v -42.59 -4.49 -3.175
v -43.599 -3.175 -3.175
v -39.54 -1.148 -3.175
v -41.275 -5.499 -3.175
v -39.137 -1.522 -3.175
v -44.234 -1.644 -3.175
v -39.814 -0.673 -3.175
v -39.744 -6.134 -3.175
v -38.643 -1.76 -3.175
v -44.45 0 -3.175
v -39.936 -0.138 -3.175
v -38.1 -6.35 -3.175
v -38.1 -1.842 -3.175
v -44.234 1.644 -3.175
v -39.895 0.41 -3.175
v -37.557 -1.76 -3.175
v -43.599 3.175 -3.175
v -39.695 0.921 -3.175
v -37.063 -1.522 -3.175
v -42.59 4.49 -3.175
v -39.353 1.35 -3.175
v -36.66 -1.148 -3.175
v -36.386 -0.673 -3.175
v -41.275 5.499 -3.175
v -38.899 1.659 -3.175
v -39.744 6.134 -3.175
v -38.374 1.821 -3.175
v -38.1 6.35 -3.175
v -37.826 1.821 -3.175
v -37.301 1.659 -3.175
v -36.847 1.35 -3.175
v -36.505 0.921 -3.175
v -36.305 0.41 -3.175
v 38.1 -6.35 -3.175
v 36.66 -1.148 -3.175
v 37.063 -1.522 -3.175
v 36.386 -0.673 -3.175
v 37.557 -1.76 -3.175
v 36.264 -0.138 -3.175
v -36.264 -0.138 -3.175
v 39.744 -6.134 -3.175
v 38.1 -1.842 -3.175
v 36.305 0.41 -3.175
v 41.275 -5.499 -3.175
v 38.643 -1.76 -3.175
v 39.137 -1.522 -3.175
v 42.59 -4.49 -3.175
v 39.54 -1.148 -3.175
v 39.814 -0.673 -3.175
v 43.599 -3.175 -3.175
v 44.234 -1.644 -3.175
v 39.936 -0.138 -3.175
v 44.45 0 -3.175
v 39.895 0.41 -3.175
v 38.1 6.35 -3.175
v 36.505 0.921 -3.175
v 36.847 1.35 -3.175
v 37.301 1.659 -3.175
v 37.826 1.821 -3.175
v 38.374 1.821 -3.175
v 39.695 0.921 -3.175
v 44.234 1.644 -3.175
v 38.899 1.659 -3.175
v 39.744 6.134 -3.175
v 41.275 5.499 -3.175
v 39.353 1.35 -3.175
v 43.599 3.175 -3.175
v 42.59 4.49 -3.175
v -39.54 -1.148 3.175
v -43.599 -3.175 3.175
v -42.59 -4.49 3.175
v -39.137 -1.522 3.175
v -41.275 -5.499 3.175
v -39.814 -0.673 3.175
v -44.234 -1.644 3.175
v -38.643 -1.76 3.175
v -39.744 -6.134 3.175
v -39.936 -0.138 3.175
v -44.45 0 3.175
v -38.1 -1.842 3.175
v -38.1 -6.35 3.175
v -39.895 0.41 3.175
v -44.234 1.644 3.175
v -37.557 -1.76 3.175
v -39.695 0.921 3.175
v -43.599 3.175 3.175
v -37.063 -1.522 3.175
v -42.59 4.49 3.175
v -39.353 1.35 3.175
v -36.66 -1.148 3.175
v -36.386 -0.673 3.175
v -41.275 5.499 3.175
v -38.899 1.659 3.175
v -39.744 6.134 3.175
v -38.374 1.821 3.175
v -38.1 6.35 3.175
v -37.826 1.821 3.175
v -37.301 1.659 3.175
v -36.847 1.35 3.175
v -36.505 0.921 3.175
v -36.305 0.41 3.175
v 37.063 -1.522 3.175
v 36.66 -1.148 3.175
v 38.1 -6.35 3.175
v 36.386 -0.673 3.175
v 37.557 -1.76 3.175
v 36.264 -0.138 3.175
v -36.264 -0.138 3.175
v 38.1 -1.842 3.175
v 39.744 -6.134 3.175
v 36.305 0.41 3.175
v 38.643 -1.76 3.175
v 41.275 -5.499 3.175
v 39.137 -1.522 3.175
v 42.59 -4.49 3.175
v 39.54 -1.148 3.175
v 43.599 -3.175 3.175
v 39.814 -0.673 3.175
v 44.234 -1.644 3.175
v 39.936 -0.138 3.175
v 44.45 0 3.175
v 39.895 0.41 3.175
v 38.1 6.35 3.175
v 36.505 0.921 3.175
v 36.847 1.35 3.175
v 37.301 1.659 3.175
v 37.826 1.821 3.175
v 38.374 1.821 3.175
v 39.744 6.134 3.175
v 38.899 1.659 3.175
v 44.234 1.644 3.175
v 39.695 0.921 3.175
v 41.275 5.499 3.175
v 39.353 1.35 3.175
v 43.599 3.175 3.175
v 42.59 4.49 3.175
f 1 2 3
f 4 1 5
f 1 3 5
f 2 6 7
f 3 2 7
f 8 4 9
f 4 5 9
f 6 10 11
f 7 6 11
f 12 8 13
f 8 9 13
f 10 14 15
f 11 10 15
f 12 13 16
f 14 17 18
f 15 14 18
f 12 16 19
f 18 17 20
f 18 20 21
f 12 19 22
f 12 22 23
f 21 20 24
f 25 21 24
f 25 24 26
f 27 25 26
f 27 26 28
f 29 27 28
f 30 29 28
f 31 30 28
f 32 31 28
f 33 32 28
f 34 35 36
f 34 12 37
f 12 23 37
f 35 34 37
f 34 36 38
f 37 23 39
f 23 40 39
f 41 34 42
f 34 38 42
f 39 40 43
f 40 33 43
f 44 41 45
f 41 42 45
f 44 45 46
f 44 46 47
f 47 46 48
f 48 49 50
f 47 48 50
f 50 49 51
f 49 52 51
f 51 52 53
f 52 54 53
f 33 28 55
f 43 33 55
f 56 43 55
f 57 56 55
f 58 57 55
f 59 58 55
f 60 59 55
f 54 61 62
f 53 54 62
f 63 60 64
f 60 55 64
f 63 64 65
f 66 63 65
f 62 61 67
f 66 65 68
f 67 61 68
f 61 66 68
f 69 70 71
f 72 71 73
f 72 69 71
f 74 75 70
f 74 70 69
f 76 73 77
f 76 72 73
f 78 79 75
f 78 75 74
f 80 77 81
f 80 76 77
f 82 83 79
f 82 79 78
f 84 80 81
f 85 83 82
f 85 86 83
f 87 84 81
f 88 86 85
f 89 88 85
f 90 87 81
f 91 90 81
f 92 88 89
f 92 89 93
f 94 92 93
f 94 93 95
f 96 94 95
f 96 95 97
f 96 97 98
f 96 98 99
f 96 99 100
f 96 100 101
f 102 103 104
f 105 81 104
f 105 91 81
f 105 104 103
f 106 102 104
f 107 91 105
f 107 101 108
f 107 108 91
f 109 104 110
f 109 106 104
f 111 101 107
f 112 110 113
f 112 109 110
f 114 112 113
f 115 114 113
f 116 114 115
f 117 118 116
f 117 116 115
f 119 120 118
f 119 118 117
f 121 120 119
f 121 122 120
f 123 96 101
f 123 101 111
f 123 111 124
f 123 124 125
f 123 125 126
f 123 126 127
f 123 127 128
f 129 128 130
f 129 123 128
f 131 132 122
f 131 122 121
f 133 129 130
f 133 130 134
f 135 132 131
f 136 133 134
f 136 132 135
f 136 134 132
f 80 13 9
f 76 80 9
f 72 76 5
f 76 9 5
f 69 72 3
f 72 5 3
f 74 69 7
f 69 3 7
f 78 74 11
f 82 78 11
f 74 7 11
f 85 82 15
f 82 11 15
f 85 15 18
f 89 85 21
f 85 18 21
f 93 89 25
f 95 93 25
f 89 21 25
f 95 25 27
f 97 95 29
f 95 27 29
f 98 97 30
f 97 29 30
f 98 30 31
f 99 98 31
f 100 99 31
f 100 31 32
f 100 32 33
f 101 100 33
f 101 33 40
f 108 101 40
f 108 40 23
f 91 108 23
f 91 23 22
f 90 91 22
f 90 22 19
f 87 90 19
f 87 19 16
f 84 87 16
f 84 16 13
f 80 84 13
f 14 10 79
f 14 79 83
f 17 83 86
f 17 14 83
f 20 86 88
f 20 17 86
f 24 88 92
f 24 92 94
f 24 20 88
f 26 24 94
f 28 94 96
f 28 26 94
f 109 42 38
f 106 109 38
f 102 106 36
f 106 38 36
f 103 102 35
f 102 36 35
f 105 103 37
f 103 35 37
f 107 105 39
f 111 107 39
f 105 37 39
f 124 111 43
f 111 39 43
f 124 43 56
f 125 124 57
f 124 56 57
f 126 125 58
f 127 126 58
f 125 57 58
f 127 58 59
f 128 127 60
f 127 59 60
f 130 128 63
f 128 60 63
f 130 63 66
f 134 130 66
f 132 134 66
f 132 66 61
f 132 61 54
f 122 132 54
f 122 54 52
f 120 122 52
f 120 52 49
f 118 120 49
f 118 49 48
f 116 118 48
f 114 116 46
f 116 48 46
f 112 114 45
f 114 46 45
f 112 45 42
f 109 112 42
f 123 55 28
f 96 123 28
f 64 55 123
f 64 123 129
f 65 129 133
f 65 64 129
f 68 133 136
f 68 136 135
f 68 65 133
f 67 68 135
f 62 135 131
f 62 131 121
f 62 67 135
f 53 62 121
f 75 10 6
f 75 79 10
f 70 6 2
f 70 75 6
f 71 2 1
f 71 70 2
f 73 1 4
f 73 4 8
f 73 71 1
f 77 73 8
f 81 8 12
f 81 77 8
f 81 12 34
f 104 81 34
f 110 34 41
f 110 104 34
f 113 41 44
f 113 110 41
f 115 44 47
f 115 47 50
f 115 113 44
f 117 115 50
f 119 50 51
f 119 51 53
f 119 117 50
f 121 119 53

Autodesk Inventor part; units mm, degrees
ref_plane "YZ Plane" through (0, 0, 0) normal (1, 0, 0) x (0, 1, 0)
ref_plane "XZ Plane" through (0, 0, 0) normal (0, 1, 0) x (-1, 0, 0)
ref_plane "XY Plane" through (0, 0, 0) normal (0, 0, 1) x (1, 0, 0)
sketch "Sketch1" plane through (0, 0, 0) normal (0, 0, 1) x (1, 0, 0)
  line L0 (-44.45, -6.35) -> (44.45, -6.35)
  line L1 (44.45, -6.35) -> (44.45, 6.35)
  line L2 (44.45, 6.35) -> (-44.45, 6.35)
  line L3 (-44.45, 6.35) -> (-44.45, -6.35)
  line L4 (-44.45, -6.35) -> (44.45, 6.35) construction
  line L5 (44.45, -6.35) -> (-44.45, 6.35) construction
  point P0 (0, 0)
  dimension "d0" = 88.9
  dimension "d1" = 12.7
extrude "Plate1" add sketch "Sketch1" along normal mid plane 6.35
fillet "Corner Round1" radius 6.35 4 edges at (-44.45, -6.35, 0) (-44.45, 6.35, 0) (44.45, 6.35, 0) (44.45, -6.35, 0)
sketch "Sketch4" plane through (0, 0, 3.175) normal (0, 0, 1) x (1, 0, 0)
  arc A0 (-38.1, 6.35) -> (-38.1, -6.35) centre (-38.1, 0) ccw construction
  arc A1 (38.1, -6.35) -> (38.1, 6.35) centre (38.1, 0) ccw construction
  point P0 (0, 0)
hole "Hole1" at (-38.1, 0, 3.175) at (38.1, 0, 3.175) direction (0, 0, -1) diameter 3.683 end through all thread size "10-24 UNC" class "2B" standard "ANSI Unified Screw Threads"
equation "\"d29\" = Thickness"
equation "\"d2\" = Thickness"
equation "\"BendRadius\" = Thickness"
equation "\"BendReliefWidth\" = Thickness"
equation "\"BendReliefDepth\" = 0.5 * Thickness"
equation "\"CornerReliefSize\" = 4 * Thickness"
equation "\"MinimumRemnant\" = 2 * Thickness"
equation "\"TransitionRadius\" = BendRadius"
equation "\"JacobiRadiusSize\" = BendRadius"
equation "\"GapSize\" = Thickness"
equation "\"Thickness\" = 6.35"
properties part number "MOUNT,STRAP,BATTERY" material "Aluminum 7075"
